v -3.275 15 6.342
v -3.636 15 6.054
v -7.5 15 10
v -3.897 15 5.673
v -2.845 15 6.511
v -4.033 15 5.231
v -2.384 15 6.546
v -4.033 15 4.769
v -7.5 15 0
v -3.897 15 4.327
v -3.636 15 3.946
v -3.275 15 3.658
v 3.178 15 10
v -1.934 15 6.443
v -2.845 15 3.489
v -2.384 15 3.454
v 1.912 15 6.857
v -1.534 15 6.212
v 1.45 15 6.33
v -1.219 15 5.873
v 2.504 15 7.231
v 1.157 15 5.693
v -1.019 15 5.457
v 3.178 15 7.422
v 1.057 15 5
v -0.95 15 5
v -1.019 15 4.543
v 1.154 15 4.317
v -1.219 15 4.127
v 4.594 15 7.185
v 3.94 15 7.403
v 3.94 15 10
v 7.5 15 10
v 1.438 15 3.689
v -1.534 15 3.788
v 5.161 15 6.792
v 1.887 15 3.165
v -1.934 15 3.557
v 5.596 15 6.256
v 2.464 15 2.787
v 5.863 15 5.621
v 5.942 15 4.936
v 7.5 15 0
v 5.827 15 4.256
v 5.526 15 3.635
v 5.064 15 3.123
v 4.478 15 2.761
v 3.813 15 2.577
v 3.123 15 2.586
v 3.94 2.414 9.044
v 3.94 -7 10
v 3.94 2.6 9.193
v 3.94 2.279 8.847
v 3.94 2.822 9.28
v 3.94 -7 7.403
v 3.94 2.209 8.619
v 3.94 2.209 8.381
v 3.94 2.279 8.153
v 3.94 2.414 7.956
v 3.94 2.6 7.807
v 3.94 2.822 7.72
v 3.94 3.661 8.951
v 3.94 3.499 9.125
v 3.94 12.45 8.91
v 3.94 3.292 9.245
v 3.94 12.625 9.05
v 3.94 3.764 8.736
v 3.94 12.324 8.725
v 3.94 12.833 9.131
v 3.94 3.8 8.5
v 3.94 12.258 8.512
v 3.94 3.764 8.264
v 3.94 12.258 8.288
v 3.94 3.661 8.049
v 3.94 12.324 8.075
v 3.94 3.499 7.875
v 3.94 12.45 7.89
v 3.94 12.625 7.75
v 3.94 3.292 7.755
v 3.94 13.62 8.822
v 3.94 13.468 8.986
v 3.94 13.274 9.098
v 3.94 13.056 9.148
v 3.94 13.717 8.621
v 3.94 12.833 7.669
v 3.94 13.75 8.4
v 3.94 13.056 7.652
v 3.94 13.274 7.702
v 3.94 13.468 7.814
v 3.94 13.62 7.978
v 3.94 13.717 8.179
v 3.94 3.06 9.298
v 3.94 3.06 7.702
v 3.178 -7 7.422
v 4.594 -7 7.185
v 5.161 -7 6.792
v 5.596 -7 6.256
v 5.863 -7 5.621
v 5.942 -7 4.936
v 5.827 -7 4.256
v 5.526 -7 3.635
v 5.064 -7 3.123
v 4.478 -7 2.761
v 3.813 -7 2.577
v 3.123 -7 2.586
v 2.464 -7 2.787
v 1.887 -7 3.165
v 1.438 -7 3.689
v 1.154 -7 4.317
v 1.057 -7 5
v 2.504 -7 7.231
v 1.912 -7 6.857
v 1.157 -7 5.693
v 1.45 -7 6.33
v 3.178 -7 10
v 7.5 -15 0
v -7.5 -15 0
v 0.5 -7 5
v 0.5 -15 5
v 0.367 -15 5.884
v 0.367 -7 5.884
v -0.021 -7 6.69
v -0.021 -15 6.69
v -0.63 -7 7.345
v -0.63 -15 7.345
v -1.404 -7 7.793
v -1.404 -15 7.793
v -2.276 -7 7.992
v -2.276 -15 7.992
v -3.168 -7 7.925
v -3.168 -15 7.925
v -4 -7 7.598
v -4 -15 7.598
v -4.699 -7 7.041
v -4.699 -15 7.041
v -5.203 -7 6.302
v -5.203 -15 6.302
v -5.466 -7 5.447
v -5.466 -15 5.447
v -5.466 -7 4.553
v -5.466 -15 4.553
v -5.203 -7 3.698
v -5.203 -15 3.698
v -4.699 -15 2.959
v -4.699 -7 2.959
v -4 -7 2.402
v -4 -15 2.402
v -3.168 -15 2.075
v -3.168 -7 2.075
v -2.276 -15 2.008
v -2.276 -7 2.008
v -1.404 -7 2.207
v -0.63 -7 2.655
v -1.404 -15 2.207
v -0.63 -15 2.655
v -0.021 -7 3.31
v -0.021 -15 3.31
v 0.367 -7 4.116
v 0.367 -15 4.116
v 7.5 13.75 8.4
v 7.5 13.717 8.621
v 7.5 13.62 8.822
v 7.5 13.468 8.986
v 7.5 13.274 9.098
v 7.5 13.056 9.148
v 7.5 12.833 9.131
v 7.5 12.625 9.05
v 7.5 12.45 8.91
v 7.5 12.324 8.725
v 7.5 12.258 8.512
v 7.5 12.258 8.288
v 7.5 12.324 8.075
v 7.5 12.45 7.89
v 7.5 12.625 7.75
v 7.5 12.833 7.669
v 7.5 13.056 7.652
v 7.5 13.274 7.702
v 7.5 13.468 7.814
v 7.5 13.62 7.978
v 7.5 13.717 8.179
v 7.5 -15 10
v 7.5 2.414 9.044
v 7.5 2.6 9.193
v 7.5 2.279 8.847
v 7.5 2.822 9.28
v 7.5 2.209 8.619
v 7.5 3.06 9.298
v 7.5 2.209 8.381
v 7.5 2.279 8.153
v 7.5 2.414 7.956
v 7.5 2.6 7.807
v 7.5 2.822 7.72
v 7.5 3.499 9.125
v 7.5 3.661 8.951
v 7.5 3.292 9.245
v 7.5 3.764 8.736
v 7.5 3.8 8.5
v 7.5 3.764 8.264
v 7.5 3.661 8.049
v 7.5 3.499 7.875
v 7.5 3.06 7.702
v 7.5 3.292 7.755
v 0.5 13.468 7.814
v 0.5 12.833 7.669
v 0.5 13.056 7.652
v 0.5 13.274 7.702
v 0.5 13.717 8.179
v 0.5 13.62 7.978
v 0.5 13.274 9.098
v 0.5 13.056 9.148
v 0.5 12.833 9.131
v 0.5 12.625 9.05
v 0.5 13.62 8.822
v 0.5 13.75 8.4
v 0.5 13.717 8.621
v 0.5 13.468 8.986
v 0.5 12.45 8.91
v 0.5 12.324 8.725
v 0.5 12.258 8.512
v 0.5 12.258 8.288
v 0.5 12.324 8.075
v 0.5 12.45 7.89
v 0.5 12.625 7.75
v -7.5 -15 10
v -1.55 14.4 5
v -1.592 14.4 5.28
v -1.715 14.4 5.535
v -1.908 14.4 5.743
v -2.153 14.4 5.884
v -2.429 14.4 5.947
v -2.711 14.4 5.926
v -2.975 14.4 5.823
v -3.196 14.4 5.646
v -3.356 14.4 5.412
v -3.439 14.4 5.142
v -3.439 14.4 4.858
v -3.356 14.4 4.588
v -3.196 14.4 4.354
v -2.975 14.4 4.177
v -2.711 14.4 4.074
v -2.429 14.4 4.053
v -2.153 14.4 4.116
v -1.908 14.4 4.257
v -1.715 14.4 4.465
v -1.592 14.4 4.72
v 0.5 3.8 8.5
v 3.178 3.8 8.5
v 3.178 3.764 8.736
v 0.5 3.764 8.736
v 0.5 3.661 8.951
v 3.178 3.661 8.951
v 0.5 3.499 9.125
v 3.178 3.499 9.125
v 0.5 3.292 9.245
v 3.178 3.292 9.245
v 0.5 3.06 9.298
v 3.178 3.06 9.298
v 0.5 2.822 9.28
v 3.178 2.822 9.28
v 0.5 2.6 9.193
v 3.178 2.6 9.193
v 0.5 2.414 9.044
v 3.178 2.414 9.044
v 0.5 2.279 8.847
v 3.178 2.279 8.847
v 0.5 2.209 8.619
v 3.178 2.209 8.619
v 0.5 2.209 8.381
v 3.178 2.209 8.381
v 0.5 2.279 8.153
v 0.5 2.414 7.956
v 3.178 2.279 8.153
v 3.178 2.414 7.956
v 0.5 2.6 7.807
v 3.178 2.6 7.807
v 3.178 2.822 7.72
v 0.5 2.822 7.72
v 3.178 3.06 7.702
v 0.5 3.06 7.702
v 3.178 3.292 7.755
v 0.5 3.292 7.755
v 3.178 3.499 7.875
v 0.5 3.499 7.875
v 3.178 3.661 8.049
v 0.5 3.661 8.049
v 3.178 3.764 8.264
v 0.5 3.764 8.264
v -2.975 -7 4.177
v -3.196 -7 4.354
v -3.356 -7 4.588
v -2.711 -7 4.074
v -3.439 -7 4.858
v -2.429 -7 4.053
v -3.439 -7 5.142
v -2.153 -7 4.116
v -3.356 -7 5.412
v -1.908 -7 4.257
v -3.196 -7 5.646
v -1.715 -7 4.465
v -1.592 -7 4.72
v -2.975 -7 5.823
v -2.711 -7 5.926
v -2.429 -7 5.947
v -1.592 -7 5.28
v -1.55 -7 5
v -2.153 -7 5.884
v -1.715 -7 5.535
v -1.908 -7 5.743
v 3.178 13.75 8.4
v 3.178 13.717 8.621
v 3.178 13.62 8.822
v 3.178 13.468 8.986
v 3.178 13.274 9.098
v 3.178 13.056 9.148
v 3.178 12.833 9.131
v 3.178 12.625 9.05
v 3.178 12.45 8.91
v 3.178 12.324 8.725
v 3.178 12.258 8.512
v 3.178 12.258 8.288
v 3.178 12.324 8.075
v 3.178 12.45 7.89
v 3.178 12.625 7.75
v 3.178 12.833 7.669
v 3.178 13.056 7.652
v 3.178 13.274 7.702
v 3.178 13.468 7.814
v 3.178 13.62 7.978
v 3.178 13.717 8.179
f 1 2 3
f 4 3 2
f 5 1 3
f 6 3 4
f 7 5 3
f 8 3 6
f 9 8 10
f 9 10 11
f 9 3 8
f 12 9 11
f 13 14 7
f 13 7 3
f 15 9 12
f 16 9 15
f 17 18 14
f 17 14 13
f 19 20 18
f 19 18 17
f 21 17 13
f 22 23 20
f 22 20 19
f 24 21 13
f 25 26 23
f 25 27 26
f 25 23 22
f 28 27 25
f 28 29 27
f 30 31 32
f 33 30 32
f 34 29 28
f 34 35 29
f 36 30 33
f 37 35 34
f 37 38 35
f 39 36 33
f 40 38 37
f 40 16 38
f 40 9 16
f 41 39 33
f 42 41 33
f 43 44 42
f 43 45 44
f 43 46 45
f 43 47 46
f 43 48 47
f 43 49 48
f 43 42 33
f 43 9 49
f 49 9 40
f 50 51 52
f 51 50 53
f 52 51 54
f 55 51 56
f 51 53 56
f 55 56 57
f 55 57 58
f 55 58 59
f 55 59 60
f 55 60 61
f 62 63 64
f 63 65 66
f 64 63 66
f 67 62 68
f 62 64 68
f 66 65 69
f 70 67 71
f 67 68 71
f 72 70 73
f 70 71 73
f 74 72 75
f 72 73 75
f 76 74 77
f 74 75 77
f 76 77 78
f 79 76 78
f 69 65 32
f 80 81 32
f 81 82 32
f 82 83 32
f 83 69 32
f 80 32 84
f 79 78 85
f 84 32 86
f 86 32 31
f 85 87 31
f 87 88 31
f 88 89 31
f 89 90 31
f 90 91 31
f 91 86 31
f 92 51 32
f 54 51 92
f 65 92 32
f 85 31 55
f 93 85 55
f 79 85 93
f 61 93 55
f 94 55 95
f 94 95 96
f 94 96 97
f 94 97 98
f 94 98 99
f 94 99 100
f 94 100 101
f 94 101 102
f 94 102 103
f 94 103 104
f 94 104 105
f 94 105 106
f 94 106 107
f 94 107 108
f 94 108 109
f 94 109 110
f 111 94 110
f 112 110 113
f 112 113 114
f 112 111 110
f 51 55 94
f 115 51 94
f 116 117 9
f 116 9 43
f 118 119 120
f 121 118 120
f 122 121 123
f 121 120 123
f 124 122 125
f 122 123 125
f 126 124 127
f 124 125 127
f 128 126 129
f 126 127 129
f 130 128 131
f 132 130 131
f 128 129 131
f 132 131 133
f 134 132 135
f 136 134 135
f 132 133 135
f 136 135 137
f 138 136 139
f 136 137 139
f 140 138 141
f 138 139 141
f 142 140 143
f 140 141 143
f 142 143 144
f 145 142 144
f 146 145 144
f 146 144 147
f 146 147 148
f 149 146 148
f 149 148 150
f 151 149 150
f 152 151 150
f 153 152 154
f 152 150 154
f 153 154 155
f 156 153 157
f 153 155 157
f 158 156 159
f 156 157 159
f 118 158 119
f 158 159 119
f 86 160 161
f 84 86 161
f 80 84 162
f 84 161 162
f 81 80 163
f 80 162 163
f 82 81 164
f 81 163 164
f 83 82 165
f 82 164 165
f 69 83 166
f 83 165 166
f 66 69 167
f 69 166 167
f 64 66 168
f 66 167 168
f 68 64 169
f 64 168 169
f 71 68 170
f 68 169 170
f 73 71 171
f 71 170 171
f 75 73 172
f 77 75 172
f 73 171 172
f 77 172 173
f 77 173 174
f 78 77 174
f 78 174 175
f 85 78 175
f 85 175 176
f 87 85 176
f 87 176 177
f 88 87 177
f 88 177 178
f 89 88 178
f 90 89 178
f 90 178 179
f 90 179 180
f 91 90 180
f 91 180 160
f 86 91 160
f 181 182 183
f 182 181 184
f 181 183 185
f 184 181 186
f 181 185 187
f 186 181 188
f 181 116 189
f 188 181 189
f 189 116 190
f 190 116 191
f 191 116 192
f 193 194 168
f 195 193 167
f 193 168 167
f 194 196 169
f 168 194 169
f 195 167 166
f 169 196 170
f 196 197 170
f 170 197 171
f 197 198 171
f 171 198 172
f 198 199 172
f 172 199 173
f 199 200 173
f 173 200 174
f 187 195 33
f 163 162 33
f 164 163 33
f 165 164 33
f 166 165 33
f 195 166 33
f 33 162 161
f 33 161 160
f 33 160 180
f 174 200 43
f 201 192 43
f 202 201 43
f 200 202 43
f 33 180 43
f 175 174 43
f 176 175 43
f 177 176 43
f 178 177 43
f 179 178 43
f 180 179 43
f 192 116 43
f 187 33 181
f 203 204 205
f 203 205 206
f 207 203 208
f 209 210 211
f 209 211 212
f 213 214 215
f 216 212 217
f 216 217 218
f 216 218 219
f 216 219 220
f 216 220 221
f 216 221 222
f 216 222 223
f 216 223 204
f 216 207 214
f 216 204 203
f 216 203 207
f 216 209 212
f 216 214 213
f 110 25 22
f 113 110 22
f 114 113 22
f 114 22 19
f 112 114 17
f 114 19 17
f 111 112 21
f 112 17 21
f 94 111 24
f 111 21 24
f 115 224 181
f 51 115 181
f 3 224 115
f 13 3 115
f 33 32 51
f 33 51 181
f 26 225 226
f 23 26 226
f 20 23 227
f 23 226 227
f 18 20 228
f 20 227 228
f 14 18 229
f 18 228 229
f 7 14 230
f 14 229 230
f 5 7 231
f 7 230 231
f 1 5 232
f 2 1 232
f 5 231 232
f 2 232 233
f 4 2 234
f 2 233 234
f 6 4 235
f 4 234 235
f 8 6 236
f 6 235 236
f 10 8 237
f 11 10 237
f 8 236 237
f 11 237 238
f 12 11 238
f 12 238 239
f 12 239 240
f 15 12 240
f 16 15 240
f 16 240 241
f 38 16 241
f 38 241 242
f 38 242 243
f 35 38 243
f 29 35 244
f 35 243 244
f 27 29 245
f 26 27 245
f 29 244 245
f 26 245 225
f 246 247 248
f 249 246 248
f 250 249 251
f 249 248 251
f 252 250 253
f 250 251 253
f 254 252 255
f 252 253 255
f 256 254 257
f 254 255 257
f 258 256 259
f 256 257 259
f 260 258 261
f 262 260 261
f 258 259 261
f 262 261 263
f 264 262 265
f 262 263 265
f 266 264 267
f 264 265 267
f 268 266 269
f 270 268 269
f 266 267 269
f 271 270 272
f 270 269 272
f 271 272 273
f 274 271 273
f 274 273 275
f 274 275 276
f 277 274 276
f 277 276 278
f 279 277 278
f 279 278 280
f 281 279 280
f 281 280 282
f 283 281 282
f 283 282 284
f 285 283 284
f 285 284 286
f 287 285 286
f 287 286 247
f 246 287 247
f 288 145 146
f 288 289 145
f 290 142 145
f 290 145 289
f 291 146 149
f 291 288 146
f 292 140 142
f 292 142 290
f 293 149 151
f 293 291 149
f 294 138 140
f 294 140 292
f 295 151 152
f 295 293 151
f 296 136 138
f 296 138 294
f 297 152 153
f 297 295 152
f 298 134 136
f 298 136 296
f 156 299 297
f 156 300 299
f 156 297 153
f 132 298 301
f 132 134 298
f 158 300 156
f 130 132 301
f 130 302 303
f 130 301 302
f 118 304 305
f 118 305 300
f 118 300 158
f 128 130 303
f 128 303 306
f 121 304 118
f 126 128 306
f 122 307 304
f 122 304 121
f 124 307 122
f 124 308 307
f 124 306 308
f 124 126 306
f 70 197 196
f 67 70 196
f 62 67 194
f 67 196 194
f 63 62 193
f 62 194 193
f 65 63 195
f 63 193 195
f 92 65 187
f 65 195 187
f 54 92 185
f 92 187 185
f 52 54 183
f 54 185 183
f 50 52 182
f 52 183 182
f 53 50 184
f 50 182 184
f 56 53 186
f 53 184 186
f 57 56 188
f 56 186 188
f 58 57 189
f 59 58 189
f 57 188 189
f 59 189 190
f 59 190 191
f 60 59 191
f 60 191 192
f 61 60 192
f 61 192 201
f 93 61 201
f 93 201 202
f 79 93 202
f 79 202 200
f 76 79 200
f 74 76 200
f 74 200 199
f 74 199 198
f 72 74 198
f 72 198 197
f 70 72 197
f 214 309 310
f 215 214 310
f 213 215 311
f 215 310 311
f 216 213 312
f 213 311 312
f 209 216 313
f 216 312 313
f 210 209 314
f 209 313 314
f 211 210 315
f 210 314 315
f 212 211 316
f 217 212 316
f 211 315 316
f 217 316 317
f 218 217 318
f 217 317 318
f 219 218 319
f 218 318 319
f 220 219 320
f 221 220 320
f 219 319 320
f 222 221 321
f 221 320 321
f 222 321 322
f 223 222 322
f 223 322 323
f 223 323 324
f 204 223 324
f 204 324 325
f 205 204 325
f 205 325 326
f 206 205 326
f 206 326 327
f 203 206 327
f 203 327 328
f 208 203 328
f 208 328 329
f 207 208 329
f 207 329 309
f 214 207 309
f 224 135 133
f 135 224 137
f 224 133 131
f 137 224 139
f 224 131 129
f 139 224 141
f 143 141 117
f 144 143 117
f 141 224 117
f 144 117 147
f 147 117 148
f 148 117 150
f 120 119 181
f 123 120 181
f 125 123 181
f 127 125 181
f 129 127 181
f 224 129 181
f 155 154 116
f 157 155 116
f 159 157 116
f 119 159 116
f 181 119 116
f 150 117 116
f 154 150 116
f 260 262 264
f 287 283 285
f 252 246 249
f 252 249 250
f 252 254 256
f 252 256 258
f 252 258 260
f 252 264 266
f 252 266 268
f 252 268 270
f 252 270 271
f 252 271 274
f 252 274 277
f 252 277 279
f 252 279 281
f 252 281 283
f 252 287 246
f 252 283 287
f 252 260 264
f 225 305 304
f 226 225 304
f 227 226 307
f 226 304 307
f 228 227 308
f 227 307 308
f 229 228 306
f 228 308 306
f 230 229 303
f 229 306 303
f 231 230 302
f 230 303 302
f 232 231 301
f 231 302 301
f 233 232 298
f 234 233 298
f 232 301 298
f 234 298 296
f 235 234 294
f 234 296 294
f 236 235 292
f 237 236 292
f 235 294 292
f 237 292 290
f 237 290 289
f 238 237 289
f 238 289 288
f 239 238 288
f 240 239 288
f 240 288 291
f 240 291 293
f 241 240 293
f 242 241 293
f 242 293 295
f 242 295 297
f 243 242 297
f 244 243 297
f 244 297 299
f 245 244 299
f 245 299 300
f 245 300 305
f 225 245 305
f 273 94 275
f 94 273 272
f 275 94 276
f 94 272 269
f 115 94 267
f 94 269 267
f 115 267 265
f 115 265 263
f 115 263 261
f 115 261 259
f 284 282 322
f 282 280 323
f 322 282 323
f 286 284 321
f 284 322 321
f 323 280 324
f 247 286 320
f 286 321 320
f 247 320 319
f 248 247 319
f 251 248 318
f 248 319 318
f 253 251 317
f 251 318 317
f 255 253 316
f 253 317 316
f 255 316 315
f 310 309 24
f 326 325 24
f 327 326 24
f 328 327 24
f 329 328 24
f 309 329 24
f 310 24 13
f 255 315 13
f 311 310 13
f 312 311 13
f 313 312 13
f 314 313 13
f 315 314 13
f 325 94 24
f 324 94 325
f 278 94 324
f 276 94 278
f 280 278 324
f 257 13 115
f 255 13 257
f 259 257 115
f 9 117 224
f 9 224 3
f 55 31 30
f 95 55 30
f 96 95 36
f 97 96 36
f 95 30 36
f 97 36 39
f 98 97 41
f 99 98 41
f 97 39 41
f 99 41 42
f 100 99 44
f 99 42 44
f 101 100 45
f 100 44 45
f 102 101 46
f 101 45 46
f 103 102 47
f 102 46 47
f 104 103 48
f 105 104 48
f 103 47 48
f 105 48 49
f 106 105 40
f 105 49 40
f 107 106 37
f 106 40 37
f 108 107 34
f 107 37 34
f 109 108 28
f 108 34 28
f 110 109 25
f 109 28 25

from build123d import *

# Parameters (mm, degrees)
F0_W     = 15
F0_H     = 30
F1_DEPTH = 10
F3_DEPTH = 22
F4_R     = 0.75
F4_R_2   = 0.8
F5_DEPTH = 7
F6_R     = 3
F7_DEPTH = 8
F8_R     = 0.95
F9_DEPTH = 25.4
F10_SIZE = 0.6


with BuildPart() as f1:
    # F0 (on Top) → F1 (new body)
    with BuildSketch(Plane.XY):
        Rectangle(F0_W, F0_H)
    extrude(amount=F1_DEPTH)

    # F2 (on face) → F3 (cut)
    with BuildSketch(Plane(origin=(0, 15, 0), x_dir=(-1, 0, 0), z_dir=(0, 1, 0))):
        with BuildLine():
            ThreePointArc((-3.940234, 7.403292), (-5.06429, 3.123137), (-1.05672, 5))
            ThreePointArc((-1.05672, 5), (-1.662096, 6.609884), (-3.178234, 7.422))
            ThreePointArc((-3.178234, 7.422), (-3.559968, 7.442544), (-3.940234, 7.403292))
        make_face()
        with BuildLine():
            ThreePointArc((-3.940234, 7.403292), (-3.559968, 7.442544), (-3.178234, 7.422))
            Line((-3.178234, 7.422), (-3.178234, 10))
            Line((-3.178234, 10), (-3.940234, 10))
            Line((-3.940234, 10), (-3.940234, 7.403292))
        make_face()
    extrude(amount=-F3_DEPTH, mode=Mode.SUBTRACT)

    # F4 (on face) → F5 (cut)
    with BuildSketch(Plane.YZ.offset(7.5)):
        with Locations((13, 8.4)):
            Circle(F4_R)
        with Locations((3, 8.5)):
            Circle(F4_R_2)
    extrude(amount=-F5_DEPTH, mode=Mode.SUBTRACT)

    # F6 (on face) → F7 (cut)
    with BuildSketch(Plane.XZ.offset(15)):
        with Locations((-2.5, 5)):
            Circle(F6_R)
    extrude(amount=-F7_DEPTH, mode=Mode.SUBTRACT)

    # F8 (on face) → F9 (cut)
    with BuildSketch(Plane.XZ.offset(7)):
        with Locations((-2.5, 5)):
            Circle(F8_R)
    extrude(amount=-F9_DEPTH, mode=Mode.SUBTRACT)

    # F10
    f10_edges = [f1.edges().sort_by_distance(p)[0] for p in [
        (-3.45, 15, 5),
    ]]
    chamfer(f10_edges, length=F10_SIZE)


solid = f1.part
